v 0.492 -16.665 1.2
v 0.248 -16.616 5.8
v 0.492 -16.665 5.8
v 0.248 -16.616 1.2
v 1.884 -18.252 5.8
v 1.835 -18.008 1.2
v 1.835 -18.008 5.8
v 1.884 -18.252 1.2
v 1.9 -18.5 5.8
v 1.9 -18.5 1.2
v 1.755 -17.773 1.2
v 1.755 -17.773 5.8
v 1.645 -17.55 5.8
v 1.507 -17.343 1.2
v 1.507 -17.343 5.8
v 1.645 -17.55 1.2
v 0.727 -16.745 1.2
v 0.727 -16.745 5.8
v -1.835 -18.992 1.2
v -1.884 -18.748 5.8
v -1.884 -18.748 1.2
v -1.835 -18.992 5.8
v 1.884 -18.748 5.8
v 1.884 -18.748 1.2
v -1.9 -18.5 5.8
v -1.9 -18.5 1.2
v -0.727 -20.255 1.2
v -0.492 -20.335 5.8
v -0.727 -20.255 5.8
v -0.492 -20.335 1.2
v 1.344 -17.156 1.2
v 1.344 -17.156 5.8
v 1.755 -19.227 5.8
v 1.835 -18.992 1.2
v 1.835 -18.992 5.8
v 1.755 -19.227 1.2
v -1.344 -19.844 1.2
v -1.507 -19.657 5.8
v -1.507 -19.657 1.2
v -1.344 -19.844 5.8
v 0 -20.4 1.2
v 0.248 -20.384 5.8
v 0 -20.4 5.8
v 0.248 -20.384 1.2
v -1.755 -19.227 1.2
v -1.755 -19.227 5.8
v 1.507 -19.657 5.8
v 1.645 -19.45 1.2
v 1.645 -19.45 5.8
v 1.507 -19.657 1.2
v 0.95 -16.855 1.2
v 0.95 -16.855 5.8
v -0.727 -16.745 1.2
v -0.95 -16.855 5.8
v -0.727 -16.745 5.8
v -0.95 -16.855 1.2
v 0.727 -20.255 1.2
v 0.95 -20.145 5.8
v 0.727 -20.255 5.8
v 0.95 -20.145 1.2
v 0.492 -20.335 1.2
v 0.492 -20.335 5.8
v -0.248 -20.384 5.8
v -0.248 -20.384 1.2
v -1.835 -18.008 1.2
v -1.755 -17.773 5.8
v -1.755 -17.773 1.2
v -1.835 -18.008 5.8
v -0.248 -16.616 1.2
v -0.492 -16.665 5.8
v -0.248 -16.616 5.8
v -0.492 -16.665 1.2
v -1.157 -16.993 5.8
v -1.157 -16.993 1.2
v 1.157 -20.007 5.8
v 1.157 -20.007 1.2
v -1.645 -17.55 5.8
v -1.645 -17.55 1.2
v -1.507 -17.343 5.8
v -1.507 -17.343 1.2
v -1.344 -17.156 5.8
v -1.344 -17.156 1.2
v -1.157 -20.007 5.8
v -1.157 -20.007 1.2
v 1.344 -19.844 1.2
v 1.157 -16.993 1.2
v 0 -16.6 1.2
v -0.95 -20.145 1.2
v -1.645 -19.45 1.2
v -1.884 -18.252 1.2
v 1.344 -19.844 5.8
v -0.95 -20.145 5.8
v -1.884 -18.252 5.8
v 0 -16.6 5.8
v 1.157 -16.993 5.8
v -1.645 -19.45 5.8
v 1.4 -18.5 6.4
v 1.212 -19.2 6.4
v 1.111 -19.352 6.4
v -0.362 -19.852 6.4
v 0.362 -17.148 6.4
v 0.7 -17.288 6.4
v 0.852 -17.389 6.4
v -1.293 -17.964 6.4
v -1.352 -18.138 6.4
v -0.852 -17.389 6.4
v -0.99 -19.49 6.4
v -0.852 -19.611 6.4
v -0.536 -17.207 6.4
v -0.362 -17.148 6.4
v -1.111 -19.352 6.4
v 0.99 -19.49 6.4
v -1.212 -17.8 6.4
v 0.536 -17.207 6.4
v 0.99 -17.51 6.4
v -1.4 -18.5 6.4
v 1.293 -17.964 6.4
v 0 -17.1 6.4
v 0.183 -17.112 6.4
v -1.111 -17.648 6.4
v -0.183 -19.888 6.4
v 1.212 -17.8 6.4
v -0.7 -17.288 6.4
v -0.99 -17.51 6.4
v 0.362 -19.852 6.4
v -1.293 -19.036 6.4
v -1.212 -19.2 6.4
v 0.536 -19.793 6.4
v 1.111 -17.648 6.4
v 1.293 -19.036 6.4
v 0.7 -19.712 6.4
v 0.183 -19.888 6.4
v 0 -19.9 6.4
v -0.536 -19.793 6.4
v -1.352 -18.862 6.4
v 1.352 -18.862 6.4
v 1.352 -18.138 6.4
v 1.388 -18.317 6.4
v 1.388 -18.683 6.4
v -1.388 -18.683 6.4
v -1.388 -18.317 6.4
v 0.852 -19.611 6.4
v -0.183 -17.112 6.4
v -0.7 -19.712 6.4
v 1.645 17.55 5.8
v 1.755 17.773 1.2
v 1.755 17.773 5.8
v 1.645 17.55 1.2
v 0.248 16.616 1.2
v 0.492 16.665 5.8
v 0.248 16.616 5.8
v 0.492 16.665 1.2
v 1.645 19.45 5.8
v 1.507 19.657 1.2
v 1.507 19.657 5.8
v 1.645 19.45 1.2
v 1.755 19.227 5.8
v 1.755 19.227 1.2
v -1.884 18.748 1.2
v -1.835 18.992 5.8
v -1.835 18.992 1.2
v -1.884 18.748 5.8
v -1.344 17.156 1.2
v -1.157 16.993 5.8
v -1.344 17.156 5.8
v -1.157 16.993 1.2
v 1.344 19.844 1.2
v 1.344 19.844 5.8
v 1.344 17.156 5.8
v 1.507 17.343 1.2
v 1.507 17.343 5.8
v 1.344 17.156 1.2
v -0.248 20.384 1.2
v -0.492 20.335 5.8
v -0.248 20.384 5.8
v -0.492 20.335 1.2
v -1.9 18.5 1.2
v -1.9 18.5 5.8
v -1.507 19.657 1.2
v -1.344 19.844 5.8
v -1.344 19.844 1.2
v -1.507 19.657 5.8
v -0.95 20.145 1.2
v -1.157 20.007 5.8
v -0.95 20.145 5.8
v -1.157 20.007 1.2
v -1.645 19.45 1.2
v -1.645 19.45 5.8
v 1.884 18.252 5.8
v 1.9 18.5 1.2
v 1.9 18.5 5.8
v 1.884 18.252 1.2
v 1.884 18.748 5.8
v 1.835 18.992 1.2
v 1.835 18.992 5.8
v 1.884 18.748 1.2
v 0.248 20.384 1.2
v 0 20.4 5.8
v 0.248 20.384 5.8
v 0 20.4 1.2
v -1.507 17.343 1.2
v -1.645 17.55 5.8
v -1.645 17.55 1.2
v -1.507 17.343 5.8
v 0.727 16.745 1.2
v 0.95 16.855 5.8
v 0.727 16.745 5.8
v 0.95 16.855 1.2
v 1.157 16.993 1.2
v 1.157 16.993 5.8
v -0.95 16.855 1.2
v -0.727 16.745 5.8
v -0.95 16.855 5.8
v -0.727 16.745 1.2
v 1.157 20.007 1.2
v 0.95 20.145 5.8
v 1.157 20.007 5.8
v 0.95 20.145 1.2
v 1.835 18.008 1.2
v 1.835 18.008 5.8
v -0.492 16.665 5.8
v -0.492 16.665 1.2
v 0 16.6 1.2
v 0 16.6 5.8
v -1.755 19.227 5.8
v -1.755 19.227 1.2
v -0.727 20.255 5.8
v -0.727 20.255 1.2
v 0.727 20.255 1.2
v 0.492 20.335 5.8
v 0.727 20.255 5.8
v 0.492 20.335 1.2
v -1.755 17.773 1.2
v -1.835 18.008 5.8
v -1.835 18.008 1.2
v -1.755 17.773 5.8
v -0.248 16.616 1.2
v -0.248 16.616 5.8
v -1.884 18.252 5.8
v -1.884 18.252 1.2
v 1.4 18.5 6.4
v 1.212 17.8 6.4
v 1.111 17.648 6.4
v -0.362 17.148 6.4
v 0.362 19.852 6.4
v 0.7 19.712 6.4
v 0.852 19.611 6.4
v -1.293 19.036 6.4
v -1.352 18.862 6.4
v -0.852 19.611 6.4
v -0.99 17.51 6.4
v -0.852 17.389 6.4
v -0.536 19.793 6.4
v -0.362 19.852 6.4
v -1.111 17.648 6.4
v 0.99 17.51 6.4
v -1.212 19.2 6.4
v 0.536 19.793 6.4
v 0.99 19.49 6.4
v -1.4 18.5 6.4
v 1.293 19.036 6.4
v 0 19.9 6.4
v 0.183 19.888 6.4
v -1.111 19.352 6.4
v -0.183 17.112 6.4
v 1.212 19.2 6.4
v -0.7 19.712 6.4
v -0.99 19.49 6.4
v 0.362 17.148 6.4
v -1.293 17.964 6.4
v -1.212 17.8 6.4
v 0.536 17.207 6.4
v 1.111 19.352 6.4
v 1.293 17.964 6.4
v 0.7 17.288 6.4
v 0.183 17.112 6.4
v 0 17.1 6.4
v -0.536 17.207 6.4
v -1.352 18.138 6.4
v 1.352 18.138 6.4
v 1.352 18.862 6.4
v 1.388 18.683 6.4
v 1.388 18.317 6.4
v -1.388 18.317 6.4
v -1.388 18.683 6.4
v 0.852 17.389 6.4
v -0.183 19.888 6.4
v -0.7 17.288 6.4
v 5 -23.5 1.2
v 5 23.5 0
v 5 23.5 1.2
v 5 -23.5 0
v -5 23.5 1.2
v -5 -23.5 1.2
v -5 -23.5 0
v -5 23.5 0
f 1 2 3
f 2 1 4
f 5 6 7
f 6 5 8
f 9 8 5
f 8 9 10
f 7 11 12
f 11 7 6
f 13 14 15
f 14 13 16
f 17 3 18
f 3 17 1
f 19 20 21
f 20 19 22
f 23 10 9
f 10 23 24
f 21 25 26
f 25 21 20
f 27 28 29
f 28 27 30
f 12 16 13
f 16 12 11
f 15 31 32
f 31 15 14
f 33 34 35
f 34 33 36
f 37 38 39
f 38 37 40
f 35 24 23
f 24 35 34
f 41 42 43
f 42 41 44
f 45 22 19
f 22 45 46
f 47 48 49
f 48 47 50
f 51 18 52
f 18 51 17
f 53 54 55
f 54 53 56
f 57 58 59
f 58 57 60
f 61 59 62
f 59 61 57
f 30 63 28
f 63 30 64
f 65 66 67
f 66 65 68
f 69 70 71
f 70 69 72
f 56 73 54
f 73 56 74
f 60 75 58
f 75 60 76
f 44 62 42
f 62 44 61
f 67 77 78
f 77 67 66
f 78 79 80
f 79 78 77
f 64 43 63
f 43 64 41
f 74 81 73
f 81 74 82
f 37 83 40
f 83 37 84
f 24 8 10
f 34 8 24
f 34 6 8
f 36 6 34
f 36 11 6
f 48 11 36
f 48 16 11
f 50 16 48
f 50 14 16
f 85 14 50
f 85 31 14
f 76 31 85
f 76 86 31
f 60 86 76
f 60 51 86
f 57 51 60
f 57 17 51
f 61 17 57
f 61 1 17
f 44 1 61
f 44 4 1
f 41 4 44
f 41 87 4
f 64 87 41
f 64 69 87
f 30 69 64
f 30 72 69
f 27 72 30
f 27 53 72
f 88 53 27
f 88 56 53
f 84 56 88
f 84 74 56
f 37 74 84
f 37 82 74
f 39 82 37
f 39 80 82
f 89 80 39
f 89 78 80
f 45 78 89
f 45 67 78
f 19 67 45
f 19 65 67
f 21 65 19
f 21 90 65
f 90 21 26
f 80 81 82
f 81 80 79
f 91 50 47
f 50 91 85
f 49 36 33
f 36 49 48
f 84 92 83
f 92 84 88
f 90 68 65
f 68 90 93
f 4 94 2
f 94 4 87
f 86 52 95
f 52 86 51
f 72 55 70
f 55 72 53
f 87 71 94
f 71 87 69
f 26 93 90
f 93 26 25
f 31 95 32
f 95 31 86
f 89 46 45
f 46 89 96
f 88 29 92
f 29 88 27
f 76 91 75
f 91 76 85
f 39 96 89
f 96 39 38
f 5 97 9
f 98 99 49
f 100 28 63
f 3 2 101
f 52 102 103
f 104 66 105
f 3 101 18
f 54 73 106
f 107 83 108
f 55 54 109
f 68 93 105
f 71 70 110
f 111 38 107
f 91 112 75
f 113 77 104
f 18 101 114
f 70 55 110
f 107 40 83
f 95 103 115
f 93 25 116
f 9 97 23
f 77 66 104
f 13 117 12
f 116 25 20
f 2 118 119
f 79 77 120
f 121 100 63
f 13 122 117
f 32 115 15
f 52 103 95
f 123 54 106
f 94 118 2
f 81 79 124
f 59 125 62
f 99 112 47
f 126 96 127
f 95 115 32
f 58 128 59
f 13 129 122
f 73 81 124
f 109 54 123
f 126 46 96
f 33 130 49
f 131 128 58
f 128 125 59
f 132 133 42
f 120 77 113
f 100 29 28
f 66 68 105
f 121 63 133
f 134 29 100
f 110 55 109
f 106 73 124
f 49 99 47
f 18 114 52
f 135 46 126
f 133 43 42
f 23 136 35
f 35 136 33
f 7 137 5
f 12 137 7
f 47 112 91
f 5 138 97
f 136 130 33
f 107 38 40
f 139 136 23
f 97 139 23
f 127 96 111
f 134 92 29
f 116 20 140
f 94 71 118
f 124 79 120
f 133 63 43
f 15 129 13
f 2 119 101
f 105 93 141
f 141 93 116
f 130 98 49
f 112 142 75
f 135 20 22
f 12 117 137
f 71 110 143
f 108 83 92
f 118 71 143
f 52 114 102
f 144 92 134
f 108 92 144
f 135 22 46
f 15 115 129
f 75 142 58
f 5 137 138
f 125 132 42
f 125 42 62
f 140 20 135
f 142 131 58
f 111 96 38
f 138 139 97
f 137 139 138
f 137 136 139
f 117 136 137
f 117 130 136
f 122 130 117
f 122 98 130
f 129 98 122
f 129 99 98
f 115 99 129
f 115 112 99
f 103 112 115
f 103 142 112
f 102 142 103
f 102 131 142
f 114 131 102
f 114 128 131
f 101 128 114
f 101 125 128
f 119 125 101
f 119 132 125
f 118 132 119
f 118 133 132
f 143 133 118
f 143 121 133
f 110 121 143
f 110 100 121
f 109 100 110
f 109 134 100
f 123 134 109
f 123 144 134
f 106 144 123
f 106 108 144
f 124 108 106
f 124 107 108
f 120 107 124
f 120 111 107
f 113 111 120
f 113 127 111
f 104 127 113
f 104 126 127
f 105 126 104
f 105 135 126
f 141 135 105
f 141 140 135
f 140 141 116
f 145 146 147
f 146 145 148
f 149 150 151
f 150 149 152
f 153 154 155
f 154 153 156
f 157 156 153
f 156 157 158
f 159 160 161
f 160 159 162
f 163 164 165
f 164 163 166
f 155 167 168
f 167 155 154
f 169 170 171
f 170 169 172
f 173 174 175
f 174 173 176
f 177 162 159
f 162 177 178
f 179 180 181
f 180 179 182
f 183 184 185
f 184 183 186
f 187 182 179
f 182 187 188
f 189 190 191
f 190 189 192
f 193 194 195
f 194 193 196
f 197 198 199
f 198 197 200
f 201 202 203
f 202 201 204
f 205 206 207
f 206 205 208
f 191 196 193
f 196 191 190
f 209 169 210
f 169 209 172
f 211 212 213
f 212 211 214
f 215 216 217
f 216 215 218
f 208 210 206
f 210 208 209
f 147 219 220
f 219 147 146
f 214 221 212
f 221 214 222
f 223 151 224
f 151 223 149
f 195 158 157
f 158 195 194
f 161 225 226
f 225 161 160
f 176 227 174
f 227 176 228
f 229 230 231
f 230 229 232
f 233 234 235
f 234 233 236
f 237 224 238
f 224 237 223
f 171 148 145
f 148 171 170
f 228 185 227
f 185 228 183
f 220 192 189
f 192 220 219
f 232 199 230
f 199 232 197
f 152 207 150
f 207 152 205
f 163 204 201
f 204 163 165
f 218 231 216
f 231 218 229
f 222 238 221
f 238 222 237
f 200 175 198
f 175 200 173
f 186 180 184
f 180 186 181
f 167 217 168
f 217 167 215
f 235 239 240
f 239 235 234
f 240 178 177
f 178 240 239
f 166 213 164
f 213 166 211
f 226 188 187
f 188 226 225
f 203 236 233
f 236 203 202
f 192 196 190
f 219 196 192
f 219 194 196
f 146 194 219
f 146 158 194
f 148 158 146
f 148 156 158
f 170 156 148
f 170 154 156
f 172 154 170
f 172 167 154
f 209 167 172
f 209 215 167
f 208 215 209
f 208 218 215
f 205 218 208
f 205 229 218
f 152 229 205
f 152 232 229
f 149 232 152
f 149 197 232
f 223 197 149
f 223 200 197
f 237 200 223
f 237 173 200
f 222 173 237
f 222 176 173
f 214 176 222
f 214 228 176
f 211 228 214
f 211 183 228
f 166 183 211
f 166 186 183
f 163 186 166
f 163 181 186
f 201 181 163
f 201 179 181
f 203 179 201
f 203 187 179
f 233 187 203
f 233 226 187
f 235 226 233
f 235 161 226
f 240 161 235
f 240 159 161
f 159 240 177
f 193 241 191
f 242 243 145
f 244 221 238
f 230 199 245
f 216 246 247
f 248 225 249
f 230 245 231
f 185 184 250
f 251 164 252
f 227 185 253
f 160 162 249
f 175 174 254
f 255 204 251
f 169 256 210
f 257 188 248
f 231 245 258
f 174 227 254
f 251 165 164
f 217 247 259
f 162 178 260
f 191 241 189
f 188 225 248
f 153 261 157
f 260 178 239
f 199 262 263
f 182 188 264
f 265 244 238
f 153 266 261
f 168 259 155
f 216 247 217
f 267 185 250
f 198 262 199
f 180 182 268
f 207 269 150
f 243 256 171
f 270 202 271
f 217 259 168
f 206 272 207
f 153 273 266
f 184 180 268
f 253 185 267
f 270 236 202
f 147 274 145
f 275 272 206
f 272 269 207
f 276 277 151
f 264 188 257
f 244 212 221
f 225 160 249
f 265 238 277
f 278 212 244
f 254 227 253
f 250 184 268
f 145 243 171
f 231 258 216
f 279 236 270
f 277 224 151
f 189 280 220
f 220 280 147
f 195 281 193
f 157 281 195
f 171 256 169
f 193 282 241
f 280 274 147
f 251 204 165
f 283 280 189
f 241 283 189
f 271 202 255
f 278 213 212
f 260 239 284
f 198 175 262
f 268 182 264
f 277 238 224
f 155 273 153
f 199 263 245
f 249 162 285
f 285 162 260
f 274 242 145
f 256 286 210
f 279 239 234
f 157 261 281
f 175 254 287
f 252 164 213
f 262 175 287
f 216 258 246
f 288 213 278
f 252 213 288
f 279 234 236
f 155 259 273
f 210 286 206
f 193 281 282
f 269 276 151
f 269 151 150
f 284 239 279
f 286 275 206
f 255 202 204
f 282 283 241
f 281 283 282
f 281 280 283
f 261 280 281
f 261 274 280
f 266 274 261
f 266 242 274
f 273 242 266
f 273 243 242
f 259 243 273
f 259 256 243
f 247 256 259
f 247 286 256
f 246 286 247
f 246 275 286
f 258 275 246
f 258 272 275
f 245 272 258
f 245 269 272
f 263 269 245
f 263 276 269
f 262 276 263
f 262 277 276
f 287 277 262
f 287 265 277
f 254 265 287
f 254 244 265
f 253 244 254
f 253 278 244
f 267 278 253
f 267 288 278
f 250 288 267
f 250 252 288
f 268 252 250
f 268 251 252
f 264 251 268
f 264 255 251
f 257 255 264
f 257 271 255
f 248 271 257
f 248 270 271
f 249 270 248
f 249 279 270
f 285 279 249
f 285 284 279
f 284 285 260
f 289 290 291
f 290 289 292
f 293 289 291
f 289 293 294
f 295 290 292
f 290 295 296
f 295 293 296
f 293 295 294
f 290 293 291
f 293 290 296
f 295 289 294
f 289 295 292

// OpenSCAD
// file: ../../lib/label.scad
// SPDX-License-Identifier: MIT
// Copyright (c) 2026 Aaron Cupp
//
// label.scad — two-colour flat-inset text labels, shared across the bench system.
//
// Generalizes the technique proven in donation-qr-stand/: the text is a recessed
// pocket in the light part, filled flush by a matching inlay printed in the dark
// colour. On a multi-toolhead printer (Snapmaker U1) load both parts at the same
// origin and assign a colour to each. Flush beats raised relief — nothing to
// catch, nothing to peel, and it survives an IPA wipe, which a printed sticker
// does not.
//
// Both modules emit the label occupying z ∈ [-LABEL_T, 0], so the caller
// translates to the face being labelled and the inlay tops out flush:
//
//     difference() { my_bin(); translate([0, 30, top_z]) label_pocket("0.45"); }
//     translate([0, 30, top_z]) label_inlay("0.45");            // dark part
//
// Single-colour fallback: label_pocket() alone gives an engraved label that
// still reads, just without the contrast.

LABEL_T    = 0.8;                            // pocket depth = inlay thickness
LABEL_FONT = "Liberation Sans:style=Bold";   // renders locally and in CI
_L_EPS     = 0.02;                           // pocket overrun so difference() is clean

// 2D text outline, centred on the origin by default.
module label_2d(txt, size = 6, font = LABEL_FONT, halign = "center", valign = "center") {
    text(txt, size = size, font = font, halign = halign, valign = valign);
}

// Solid to SUBTRACT from the light part. Overruns the face so the cut is clean.
module label_pocket(txt, size = 6, depth = LABEL_T, font = LABEL_FONT,
                    halign = "center", valign = "center") {
    translate([0, 0, -depth])
        linear_extrude(depth + _L_EPS) label_2d(txt, size, font, halign, valign);
}

// Solid to ADD to the dark part. Fills the pocket flush — no overrun.
module label_inlay(txt, size = 6, depth = LABEL_T, font = LABEL_FONT,
                   halign = "center", valign = "center") {
    translate([0, 0, -depth])
        linear_extrude(depth) label_2d(txt, size, font, halign, valign);
}

// Same pair for a text label on a VERTICAL face (bin front, divider tab), where
// the labelled surface faces +Y. Label occupies y ∈ [-LABEL_T, 0].
module label_pocket_v(txt, size = 6, depth = LABEL_T, font = LABEL_FONT) {
    rotate([90, 0, 0]) translate([0, 0, -_L_EPS])
        linear_extrude(depth + _L_EPS) label_2d(txt, size, font);
}

module label_inlay_v(txt, size = 6, depth = LABEL_T, font = LABEL_FONT) {
    rotate([90, 0, 0]) linear_extrude(depth) label_2d(txt, size, font);
}
// main file
// rig_dock_rail.scad — SUPERSEDED by rig_storage_bin. Kept for the record.
//
// Its pegs sat on the calipered 99 x 37 hole pitch, which was never coupon-tested
// for pitch, and missed the board's holes in both directions on the printed cup
// (2026-10-01). Lives in coupons/ so releases don't ship it as a part.
//
// Original note: one of two rails that hold the x16 riser on the deck.
//
// The board (PCE164P-N03 VER 006C) has the x16 slot flush along one long edge,
// capacitors crowding the other, and the 6-pin + USB filling a short end, so
// there's no clean edge to clip. It does have four mounting holes on a 99 x 37
// pitch, so: two pegs per rail, one rail under each end of the board. The
// board lies on its own factory foam pad; the pegs reach through 4 mm of foam
// + PCB and stand 1.2 proud.
//
// The rail sits flush in a pocket on the deck and is CA-glued. It's a
// separate part because the cup prints deck-down and a peg can't grow off the
// face that's on the bed.
//
// PEG_D is the fit that matters — print coupons/dock_rail_ladder.scad first.

include <../rig_common.scad>

module rig_dock_rail(peg_d = PEG_D) {
    peg_h = PEG_H_ABOVE_DECK - (RAIL_T - RAIL_POCKET);   // above the rail's top
    union() {
        translate([-RAIL_W/2, -RAIL_L/2, 0]) cube([RAIL_W, RAIL_L, RAIL_T]);
        for (sy = [-1, 1])
            translate([0, sy*RISER_HOLE_PITCH_W/2, RAIL_T]) {
                cylinder(d = peg_d, h = peg_h - 0.6);
                translate([0, 0, peg_h - 0.6]) cylinder(d1 = peg_d, d2 = peg_d - 1.0, h = 0.6);  // lead-in
            }
    }
}

rig_dock_rail();
echo(str("rig_dock_rail: ", RAIL_W, " x ", RAIL_L, ", pegs ", PEG_D, " at ", RISER_HOLE_PITCH_W, " pitch"));
